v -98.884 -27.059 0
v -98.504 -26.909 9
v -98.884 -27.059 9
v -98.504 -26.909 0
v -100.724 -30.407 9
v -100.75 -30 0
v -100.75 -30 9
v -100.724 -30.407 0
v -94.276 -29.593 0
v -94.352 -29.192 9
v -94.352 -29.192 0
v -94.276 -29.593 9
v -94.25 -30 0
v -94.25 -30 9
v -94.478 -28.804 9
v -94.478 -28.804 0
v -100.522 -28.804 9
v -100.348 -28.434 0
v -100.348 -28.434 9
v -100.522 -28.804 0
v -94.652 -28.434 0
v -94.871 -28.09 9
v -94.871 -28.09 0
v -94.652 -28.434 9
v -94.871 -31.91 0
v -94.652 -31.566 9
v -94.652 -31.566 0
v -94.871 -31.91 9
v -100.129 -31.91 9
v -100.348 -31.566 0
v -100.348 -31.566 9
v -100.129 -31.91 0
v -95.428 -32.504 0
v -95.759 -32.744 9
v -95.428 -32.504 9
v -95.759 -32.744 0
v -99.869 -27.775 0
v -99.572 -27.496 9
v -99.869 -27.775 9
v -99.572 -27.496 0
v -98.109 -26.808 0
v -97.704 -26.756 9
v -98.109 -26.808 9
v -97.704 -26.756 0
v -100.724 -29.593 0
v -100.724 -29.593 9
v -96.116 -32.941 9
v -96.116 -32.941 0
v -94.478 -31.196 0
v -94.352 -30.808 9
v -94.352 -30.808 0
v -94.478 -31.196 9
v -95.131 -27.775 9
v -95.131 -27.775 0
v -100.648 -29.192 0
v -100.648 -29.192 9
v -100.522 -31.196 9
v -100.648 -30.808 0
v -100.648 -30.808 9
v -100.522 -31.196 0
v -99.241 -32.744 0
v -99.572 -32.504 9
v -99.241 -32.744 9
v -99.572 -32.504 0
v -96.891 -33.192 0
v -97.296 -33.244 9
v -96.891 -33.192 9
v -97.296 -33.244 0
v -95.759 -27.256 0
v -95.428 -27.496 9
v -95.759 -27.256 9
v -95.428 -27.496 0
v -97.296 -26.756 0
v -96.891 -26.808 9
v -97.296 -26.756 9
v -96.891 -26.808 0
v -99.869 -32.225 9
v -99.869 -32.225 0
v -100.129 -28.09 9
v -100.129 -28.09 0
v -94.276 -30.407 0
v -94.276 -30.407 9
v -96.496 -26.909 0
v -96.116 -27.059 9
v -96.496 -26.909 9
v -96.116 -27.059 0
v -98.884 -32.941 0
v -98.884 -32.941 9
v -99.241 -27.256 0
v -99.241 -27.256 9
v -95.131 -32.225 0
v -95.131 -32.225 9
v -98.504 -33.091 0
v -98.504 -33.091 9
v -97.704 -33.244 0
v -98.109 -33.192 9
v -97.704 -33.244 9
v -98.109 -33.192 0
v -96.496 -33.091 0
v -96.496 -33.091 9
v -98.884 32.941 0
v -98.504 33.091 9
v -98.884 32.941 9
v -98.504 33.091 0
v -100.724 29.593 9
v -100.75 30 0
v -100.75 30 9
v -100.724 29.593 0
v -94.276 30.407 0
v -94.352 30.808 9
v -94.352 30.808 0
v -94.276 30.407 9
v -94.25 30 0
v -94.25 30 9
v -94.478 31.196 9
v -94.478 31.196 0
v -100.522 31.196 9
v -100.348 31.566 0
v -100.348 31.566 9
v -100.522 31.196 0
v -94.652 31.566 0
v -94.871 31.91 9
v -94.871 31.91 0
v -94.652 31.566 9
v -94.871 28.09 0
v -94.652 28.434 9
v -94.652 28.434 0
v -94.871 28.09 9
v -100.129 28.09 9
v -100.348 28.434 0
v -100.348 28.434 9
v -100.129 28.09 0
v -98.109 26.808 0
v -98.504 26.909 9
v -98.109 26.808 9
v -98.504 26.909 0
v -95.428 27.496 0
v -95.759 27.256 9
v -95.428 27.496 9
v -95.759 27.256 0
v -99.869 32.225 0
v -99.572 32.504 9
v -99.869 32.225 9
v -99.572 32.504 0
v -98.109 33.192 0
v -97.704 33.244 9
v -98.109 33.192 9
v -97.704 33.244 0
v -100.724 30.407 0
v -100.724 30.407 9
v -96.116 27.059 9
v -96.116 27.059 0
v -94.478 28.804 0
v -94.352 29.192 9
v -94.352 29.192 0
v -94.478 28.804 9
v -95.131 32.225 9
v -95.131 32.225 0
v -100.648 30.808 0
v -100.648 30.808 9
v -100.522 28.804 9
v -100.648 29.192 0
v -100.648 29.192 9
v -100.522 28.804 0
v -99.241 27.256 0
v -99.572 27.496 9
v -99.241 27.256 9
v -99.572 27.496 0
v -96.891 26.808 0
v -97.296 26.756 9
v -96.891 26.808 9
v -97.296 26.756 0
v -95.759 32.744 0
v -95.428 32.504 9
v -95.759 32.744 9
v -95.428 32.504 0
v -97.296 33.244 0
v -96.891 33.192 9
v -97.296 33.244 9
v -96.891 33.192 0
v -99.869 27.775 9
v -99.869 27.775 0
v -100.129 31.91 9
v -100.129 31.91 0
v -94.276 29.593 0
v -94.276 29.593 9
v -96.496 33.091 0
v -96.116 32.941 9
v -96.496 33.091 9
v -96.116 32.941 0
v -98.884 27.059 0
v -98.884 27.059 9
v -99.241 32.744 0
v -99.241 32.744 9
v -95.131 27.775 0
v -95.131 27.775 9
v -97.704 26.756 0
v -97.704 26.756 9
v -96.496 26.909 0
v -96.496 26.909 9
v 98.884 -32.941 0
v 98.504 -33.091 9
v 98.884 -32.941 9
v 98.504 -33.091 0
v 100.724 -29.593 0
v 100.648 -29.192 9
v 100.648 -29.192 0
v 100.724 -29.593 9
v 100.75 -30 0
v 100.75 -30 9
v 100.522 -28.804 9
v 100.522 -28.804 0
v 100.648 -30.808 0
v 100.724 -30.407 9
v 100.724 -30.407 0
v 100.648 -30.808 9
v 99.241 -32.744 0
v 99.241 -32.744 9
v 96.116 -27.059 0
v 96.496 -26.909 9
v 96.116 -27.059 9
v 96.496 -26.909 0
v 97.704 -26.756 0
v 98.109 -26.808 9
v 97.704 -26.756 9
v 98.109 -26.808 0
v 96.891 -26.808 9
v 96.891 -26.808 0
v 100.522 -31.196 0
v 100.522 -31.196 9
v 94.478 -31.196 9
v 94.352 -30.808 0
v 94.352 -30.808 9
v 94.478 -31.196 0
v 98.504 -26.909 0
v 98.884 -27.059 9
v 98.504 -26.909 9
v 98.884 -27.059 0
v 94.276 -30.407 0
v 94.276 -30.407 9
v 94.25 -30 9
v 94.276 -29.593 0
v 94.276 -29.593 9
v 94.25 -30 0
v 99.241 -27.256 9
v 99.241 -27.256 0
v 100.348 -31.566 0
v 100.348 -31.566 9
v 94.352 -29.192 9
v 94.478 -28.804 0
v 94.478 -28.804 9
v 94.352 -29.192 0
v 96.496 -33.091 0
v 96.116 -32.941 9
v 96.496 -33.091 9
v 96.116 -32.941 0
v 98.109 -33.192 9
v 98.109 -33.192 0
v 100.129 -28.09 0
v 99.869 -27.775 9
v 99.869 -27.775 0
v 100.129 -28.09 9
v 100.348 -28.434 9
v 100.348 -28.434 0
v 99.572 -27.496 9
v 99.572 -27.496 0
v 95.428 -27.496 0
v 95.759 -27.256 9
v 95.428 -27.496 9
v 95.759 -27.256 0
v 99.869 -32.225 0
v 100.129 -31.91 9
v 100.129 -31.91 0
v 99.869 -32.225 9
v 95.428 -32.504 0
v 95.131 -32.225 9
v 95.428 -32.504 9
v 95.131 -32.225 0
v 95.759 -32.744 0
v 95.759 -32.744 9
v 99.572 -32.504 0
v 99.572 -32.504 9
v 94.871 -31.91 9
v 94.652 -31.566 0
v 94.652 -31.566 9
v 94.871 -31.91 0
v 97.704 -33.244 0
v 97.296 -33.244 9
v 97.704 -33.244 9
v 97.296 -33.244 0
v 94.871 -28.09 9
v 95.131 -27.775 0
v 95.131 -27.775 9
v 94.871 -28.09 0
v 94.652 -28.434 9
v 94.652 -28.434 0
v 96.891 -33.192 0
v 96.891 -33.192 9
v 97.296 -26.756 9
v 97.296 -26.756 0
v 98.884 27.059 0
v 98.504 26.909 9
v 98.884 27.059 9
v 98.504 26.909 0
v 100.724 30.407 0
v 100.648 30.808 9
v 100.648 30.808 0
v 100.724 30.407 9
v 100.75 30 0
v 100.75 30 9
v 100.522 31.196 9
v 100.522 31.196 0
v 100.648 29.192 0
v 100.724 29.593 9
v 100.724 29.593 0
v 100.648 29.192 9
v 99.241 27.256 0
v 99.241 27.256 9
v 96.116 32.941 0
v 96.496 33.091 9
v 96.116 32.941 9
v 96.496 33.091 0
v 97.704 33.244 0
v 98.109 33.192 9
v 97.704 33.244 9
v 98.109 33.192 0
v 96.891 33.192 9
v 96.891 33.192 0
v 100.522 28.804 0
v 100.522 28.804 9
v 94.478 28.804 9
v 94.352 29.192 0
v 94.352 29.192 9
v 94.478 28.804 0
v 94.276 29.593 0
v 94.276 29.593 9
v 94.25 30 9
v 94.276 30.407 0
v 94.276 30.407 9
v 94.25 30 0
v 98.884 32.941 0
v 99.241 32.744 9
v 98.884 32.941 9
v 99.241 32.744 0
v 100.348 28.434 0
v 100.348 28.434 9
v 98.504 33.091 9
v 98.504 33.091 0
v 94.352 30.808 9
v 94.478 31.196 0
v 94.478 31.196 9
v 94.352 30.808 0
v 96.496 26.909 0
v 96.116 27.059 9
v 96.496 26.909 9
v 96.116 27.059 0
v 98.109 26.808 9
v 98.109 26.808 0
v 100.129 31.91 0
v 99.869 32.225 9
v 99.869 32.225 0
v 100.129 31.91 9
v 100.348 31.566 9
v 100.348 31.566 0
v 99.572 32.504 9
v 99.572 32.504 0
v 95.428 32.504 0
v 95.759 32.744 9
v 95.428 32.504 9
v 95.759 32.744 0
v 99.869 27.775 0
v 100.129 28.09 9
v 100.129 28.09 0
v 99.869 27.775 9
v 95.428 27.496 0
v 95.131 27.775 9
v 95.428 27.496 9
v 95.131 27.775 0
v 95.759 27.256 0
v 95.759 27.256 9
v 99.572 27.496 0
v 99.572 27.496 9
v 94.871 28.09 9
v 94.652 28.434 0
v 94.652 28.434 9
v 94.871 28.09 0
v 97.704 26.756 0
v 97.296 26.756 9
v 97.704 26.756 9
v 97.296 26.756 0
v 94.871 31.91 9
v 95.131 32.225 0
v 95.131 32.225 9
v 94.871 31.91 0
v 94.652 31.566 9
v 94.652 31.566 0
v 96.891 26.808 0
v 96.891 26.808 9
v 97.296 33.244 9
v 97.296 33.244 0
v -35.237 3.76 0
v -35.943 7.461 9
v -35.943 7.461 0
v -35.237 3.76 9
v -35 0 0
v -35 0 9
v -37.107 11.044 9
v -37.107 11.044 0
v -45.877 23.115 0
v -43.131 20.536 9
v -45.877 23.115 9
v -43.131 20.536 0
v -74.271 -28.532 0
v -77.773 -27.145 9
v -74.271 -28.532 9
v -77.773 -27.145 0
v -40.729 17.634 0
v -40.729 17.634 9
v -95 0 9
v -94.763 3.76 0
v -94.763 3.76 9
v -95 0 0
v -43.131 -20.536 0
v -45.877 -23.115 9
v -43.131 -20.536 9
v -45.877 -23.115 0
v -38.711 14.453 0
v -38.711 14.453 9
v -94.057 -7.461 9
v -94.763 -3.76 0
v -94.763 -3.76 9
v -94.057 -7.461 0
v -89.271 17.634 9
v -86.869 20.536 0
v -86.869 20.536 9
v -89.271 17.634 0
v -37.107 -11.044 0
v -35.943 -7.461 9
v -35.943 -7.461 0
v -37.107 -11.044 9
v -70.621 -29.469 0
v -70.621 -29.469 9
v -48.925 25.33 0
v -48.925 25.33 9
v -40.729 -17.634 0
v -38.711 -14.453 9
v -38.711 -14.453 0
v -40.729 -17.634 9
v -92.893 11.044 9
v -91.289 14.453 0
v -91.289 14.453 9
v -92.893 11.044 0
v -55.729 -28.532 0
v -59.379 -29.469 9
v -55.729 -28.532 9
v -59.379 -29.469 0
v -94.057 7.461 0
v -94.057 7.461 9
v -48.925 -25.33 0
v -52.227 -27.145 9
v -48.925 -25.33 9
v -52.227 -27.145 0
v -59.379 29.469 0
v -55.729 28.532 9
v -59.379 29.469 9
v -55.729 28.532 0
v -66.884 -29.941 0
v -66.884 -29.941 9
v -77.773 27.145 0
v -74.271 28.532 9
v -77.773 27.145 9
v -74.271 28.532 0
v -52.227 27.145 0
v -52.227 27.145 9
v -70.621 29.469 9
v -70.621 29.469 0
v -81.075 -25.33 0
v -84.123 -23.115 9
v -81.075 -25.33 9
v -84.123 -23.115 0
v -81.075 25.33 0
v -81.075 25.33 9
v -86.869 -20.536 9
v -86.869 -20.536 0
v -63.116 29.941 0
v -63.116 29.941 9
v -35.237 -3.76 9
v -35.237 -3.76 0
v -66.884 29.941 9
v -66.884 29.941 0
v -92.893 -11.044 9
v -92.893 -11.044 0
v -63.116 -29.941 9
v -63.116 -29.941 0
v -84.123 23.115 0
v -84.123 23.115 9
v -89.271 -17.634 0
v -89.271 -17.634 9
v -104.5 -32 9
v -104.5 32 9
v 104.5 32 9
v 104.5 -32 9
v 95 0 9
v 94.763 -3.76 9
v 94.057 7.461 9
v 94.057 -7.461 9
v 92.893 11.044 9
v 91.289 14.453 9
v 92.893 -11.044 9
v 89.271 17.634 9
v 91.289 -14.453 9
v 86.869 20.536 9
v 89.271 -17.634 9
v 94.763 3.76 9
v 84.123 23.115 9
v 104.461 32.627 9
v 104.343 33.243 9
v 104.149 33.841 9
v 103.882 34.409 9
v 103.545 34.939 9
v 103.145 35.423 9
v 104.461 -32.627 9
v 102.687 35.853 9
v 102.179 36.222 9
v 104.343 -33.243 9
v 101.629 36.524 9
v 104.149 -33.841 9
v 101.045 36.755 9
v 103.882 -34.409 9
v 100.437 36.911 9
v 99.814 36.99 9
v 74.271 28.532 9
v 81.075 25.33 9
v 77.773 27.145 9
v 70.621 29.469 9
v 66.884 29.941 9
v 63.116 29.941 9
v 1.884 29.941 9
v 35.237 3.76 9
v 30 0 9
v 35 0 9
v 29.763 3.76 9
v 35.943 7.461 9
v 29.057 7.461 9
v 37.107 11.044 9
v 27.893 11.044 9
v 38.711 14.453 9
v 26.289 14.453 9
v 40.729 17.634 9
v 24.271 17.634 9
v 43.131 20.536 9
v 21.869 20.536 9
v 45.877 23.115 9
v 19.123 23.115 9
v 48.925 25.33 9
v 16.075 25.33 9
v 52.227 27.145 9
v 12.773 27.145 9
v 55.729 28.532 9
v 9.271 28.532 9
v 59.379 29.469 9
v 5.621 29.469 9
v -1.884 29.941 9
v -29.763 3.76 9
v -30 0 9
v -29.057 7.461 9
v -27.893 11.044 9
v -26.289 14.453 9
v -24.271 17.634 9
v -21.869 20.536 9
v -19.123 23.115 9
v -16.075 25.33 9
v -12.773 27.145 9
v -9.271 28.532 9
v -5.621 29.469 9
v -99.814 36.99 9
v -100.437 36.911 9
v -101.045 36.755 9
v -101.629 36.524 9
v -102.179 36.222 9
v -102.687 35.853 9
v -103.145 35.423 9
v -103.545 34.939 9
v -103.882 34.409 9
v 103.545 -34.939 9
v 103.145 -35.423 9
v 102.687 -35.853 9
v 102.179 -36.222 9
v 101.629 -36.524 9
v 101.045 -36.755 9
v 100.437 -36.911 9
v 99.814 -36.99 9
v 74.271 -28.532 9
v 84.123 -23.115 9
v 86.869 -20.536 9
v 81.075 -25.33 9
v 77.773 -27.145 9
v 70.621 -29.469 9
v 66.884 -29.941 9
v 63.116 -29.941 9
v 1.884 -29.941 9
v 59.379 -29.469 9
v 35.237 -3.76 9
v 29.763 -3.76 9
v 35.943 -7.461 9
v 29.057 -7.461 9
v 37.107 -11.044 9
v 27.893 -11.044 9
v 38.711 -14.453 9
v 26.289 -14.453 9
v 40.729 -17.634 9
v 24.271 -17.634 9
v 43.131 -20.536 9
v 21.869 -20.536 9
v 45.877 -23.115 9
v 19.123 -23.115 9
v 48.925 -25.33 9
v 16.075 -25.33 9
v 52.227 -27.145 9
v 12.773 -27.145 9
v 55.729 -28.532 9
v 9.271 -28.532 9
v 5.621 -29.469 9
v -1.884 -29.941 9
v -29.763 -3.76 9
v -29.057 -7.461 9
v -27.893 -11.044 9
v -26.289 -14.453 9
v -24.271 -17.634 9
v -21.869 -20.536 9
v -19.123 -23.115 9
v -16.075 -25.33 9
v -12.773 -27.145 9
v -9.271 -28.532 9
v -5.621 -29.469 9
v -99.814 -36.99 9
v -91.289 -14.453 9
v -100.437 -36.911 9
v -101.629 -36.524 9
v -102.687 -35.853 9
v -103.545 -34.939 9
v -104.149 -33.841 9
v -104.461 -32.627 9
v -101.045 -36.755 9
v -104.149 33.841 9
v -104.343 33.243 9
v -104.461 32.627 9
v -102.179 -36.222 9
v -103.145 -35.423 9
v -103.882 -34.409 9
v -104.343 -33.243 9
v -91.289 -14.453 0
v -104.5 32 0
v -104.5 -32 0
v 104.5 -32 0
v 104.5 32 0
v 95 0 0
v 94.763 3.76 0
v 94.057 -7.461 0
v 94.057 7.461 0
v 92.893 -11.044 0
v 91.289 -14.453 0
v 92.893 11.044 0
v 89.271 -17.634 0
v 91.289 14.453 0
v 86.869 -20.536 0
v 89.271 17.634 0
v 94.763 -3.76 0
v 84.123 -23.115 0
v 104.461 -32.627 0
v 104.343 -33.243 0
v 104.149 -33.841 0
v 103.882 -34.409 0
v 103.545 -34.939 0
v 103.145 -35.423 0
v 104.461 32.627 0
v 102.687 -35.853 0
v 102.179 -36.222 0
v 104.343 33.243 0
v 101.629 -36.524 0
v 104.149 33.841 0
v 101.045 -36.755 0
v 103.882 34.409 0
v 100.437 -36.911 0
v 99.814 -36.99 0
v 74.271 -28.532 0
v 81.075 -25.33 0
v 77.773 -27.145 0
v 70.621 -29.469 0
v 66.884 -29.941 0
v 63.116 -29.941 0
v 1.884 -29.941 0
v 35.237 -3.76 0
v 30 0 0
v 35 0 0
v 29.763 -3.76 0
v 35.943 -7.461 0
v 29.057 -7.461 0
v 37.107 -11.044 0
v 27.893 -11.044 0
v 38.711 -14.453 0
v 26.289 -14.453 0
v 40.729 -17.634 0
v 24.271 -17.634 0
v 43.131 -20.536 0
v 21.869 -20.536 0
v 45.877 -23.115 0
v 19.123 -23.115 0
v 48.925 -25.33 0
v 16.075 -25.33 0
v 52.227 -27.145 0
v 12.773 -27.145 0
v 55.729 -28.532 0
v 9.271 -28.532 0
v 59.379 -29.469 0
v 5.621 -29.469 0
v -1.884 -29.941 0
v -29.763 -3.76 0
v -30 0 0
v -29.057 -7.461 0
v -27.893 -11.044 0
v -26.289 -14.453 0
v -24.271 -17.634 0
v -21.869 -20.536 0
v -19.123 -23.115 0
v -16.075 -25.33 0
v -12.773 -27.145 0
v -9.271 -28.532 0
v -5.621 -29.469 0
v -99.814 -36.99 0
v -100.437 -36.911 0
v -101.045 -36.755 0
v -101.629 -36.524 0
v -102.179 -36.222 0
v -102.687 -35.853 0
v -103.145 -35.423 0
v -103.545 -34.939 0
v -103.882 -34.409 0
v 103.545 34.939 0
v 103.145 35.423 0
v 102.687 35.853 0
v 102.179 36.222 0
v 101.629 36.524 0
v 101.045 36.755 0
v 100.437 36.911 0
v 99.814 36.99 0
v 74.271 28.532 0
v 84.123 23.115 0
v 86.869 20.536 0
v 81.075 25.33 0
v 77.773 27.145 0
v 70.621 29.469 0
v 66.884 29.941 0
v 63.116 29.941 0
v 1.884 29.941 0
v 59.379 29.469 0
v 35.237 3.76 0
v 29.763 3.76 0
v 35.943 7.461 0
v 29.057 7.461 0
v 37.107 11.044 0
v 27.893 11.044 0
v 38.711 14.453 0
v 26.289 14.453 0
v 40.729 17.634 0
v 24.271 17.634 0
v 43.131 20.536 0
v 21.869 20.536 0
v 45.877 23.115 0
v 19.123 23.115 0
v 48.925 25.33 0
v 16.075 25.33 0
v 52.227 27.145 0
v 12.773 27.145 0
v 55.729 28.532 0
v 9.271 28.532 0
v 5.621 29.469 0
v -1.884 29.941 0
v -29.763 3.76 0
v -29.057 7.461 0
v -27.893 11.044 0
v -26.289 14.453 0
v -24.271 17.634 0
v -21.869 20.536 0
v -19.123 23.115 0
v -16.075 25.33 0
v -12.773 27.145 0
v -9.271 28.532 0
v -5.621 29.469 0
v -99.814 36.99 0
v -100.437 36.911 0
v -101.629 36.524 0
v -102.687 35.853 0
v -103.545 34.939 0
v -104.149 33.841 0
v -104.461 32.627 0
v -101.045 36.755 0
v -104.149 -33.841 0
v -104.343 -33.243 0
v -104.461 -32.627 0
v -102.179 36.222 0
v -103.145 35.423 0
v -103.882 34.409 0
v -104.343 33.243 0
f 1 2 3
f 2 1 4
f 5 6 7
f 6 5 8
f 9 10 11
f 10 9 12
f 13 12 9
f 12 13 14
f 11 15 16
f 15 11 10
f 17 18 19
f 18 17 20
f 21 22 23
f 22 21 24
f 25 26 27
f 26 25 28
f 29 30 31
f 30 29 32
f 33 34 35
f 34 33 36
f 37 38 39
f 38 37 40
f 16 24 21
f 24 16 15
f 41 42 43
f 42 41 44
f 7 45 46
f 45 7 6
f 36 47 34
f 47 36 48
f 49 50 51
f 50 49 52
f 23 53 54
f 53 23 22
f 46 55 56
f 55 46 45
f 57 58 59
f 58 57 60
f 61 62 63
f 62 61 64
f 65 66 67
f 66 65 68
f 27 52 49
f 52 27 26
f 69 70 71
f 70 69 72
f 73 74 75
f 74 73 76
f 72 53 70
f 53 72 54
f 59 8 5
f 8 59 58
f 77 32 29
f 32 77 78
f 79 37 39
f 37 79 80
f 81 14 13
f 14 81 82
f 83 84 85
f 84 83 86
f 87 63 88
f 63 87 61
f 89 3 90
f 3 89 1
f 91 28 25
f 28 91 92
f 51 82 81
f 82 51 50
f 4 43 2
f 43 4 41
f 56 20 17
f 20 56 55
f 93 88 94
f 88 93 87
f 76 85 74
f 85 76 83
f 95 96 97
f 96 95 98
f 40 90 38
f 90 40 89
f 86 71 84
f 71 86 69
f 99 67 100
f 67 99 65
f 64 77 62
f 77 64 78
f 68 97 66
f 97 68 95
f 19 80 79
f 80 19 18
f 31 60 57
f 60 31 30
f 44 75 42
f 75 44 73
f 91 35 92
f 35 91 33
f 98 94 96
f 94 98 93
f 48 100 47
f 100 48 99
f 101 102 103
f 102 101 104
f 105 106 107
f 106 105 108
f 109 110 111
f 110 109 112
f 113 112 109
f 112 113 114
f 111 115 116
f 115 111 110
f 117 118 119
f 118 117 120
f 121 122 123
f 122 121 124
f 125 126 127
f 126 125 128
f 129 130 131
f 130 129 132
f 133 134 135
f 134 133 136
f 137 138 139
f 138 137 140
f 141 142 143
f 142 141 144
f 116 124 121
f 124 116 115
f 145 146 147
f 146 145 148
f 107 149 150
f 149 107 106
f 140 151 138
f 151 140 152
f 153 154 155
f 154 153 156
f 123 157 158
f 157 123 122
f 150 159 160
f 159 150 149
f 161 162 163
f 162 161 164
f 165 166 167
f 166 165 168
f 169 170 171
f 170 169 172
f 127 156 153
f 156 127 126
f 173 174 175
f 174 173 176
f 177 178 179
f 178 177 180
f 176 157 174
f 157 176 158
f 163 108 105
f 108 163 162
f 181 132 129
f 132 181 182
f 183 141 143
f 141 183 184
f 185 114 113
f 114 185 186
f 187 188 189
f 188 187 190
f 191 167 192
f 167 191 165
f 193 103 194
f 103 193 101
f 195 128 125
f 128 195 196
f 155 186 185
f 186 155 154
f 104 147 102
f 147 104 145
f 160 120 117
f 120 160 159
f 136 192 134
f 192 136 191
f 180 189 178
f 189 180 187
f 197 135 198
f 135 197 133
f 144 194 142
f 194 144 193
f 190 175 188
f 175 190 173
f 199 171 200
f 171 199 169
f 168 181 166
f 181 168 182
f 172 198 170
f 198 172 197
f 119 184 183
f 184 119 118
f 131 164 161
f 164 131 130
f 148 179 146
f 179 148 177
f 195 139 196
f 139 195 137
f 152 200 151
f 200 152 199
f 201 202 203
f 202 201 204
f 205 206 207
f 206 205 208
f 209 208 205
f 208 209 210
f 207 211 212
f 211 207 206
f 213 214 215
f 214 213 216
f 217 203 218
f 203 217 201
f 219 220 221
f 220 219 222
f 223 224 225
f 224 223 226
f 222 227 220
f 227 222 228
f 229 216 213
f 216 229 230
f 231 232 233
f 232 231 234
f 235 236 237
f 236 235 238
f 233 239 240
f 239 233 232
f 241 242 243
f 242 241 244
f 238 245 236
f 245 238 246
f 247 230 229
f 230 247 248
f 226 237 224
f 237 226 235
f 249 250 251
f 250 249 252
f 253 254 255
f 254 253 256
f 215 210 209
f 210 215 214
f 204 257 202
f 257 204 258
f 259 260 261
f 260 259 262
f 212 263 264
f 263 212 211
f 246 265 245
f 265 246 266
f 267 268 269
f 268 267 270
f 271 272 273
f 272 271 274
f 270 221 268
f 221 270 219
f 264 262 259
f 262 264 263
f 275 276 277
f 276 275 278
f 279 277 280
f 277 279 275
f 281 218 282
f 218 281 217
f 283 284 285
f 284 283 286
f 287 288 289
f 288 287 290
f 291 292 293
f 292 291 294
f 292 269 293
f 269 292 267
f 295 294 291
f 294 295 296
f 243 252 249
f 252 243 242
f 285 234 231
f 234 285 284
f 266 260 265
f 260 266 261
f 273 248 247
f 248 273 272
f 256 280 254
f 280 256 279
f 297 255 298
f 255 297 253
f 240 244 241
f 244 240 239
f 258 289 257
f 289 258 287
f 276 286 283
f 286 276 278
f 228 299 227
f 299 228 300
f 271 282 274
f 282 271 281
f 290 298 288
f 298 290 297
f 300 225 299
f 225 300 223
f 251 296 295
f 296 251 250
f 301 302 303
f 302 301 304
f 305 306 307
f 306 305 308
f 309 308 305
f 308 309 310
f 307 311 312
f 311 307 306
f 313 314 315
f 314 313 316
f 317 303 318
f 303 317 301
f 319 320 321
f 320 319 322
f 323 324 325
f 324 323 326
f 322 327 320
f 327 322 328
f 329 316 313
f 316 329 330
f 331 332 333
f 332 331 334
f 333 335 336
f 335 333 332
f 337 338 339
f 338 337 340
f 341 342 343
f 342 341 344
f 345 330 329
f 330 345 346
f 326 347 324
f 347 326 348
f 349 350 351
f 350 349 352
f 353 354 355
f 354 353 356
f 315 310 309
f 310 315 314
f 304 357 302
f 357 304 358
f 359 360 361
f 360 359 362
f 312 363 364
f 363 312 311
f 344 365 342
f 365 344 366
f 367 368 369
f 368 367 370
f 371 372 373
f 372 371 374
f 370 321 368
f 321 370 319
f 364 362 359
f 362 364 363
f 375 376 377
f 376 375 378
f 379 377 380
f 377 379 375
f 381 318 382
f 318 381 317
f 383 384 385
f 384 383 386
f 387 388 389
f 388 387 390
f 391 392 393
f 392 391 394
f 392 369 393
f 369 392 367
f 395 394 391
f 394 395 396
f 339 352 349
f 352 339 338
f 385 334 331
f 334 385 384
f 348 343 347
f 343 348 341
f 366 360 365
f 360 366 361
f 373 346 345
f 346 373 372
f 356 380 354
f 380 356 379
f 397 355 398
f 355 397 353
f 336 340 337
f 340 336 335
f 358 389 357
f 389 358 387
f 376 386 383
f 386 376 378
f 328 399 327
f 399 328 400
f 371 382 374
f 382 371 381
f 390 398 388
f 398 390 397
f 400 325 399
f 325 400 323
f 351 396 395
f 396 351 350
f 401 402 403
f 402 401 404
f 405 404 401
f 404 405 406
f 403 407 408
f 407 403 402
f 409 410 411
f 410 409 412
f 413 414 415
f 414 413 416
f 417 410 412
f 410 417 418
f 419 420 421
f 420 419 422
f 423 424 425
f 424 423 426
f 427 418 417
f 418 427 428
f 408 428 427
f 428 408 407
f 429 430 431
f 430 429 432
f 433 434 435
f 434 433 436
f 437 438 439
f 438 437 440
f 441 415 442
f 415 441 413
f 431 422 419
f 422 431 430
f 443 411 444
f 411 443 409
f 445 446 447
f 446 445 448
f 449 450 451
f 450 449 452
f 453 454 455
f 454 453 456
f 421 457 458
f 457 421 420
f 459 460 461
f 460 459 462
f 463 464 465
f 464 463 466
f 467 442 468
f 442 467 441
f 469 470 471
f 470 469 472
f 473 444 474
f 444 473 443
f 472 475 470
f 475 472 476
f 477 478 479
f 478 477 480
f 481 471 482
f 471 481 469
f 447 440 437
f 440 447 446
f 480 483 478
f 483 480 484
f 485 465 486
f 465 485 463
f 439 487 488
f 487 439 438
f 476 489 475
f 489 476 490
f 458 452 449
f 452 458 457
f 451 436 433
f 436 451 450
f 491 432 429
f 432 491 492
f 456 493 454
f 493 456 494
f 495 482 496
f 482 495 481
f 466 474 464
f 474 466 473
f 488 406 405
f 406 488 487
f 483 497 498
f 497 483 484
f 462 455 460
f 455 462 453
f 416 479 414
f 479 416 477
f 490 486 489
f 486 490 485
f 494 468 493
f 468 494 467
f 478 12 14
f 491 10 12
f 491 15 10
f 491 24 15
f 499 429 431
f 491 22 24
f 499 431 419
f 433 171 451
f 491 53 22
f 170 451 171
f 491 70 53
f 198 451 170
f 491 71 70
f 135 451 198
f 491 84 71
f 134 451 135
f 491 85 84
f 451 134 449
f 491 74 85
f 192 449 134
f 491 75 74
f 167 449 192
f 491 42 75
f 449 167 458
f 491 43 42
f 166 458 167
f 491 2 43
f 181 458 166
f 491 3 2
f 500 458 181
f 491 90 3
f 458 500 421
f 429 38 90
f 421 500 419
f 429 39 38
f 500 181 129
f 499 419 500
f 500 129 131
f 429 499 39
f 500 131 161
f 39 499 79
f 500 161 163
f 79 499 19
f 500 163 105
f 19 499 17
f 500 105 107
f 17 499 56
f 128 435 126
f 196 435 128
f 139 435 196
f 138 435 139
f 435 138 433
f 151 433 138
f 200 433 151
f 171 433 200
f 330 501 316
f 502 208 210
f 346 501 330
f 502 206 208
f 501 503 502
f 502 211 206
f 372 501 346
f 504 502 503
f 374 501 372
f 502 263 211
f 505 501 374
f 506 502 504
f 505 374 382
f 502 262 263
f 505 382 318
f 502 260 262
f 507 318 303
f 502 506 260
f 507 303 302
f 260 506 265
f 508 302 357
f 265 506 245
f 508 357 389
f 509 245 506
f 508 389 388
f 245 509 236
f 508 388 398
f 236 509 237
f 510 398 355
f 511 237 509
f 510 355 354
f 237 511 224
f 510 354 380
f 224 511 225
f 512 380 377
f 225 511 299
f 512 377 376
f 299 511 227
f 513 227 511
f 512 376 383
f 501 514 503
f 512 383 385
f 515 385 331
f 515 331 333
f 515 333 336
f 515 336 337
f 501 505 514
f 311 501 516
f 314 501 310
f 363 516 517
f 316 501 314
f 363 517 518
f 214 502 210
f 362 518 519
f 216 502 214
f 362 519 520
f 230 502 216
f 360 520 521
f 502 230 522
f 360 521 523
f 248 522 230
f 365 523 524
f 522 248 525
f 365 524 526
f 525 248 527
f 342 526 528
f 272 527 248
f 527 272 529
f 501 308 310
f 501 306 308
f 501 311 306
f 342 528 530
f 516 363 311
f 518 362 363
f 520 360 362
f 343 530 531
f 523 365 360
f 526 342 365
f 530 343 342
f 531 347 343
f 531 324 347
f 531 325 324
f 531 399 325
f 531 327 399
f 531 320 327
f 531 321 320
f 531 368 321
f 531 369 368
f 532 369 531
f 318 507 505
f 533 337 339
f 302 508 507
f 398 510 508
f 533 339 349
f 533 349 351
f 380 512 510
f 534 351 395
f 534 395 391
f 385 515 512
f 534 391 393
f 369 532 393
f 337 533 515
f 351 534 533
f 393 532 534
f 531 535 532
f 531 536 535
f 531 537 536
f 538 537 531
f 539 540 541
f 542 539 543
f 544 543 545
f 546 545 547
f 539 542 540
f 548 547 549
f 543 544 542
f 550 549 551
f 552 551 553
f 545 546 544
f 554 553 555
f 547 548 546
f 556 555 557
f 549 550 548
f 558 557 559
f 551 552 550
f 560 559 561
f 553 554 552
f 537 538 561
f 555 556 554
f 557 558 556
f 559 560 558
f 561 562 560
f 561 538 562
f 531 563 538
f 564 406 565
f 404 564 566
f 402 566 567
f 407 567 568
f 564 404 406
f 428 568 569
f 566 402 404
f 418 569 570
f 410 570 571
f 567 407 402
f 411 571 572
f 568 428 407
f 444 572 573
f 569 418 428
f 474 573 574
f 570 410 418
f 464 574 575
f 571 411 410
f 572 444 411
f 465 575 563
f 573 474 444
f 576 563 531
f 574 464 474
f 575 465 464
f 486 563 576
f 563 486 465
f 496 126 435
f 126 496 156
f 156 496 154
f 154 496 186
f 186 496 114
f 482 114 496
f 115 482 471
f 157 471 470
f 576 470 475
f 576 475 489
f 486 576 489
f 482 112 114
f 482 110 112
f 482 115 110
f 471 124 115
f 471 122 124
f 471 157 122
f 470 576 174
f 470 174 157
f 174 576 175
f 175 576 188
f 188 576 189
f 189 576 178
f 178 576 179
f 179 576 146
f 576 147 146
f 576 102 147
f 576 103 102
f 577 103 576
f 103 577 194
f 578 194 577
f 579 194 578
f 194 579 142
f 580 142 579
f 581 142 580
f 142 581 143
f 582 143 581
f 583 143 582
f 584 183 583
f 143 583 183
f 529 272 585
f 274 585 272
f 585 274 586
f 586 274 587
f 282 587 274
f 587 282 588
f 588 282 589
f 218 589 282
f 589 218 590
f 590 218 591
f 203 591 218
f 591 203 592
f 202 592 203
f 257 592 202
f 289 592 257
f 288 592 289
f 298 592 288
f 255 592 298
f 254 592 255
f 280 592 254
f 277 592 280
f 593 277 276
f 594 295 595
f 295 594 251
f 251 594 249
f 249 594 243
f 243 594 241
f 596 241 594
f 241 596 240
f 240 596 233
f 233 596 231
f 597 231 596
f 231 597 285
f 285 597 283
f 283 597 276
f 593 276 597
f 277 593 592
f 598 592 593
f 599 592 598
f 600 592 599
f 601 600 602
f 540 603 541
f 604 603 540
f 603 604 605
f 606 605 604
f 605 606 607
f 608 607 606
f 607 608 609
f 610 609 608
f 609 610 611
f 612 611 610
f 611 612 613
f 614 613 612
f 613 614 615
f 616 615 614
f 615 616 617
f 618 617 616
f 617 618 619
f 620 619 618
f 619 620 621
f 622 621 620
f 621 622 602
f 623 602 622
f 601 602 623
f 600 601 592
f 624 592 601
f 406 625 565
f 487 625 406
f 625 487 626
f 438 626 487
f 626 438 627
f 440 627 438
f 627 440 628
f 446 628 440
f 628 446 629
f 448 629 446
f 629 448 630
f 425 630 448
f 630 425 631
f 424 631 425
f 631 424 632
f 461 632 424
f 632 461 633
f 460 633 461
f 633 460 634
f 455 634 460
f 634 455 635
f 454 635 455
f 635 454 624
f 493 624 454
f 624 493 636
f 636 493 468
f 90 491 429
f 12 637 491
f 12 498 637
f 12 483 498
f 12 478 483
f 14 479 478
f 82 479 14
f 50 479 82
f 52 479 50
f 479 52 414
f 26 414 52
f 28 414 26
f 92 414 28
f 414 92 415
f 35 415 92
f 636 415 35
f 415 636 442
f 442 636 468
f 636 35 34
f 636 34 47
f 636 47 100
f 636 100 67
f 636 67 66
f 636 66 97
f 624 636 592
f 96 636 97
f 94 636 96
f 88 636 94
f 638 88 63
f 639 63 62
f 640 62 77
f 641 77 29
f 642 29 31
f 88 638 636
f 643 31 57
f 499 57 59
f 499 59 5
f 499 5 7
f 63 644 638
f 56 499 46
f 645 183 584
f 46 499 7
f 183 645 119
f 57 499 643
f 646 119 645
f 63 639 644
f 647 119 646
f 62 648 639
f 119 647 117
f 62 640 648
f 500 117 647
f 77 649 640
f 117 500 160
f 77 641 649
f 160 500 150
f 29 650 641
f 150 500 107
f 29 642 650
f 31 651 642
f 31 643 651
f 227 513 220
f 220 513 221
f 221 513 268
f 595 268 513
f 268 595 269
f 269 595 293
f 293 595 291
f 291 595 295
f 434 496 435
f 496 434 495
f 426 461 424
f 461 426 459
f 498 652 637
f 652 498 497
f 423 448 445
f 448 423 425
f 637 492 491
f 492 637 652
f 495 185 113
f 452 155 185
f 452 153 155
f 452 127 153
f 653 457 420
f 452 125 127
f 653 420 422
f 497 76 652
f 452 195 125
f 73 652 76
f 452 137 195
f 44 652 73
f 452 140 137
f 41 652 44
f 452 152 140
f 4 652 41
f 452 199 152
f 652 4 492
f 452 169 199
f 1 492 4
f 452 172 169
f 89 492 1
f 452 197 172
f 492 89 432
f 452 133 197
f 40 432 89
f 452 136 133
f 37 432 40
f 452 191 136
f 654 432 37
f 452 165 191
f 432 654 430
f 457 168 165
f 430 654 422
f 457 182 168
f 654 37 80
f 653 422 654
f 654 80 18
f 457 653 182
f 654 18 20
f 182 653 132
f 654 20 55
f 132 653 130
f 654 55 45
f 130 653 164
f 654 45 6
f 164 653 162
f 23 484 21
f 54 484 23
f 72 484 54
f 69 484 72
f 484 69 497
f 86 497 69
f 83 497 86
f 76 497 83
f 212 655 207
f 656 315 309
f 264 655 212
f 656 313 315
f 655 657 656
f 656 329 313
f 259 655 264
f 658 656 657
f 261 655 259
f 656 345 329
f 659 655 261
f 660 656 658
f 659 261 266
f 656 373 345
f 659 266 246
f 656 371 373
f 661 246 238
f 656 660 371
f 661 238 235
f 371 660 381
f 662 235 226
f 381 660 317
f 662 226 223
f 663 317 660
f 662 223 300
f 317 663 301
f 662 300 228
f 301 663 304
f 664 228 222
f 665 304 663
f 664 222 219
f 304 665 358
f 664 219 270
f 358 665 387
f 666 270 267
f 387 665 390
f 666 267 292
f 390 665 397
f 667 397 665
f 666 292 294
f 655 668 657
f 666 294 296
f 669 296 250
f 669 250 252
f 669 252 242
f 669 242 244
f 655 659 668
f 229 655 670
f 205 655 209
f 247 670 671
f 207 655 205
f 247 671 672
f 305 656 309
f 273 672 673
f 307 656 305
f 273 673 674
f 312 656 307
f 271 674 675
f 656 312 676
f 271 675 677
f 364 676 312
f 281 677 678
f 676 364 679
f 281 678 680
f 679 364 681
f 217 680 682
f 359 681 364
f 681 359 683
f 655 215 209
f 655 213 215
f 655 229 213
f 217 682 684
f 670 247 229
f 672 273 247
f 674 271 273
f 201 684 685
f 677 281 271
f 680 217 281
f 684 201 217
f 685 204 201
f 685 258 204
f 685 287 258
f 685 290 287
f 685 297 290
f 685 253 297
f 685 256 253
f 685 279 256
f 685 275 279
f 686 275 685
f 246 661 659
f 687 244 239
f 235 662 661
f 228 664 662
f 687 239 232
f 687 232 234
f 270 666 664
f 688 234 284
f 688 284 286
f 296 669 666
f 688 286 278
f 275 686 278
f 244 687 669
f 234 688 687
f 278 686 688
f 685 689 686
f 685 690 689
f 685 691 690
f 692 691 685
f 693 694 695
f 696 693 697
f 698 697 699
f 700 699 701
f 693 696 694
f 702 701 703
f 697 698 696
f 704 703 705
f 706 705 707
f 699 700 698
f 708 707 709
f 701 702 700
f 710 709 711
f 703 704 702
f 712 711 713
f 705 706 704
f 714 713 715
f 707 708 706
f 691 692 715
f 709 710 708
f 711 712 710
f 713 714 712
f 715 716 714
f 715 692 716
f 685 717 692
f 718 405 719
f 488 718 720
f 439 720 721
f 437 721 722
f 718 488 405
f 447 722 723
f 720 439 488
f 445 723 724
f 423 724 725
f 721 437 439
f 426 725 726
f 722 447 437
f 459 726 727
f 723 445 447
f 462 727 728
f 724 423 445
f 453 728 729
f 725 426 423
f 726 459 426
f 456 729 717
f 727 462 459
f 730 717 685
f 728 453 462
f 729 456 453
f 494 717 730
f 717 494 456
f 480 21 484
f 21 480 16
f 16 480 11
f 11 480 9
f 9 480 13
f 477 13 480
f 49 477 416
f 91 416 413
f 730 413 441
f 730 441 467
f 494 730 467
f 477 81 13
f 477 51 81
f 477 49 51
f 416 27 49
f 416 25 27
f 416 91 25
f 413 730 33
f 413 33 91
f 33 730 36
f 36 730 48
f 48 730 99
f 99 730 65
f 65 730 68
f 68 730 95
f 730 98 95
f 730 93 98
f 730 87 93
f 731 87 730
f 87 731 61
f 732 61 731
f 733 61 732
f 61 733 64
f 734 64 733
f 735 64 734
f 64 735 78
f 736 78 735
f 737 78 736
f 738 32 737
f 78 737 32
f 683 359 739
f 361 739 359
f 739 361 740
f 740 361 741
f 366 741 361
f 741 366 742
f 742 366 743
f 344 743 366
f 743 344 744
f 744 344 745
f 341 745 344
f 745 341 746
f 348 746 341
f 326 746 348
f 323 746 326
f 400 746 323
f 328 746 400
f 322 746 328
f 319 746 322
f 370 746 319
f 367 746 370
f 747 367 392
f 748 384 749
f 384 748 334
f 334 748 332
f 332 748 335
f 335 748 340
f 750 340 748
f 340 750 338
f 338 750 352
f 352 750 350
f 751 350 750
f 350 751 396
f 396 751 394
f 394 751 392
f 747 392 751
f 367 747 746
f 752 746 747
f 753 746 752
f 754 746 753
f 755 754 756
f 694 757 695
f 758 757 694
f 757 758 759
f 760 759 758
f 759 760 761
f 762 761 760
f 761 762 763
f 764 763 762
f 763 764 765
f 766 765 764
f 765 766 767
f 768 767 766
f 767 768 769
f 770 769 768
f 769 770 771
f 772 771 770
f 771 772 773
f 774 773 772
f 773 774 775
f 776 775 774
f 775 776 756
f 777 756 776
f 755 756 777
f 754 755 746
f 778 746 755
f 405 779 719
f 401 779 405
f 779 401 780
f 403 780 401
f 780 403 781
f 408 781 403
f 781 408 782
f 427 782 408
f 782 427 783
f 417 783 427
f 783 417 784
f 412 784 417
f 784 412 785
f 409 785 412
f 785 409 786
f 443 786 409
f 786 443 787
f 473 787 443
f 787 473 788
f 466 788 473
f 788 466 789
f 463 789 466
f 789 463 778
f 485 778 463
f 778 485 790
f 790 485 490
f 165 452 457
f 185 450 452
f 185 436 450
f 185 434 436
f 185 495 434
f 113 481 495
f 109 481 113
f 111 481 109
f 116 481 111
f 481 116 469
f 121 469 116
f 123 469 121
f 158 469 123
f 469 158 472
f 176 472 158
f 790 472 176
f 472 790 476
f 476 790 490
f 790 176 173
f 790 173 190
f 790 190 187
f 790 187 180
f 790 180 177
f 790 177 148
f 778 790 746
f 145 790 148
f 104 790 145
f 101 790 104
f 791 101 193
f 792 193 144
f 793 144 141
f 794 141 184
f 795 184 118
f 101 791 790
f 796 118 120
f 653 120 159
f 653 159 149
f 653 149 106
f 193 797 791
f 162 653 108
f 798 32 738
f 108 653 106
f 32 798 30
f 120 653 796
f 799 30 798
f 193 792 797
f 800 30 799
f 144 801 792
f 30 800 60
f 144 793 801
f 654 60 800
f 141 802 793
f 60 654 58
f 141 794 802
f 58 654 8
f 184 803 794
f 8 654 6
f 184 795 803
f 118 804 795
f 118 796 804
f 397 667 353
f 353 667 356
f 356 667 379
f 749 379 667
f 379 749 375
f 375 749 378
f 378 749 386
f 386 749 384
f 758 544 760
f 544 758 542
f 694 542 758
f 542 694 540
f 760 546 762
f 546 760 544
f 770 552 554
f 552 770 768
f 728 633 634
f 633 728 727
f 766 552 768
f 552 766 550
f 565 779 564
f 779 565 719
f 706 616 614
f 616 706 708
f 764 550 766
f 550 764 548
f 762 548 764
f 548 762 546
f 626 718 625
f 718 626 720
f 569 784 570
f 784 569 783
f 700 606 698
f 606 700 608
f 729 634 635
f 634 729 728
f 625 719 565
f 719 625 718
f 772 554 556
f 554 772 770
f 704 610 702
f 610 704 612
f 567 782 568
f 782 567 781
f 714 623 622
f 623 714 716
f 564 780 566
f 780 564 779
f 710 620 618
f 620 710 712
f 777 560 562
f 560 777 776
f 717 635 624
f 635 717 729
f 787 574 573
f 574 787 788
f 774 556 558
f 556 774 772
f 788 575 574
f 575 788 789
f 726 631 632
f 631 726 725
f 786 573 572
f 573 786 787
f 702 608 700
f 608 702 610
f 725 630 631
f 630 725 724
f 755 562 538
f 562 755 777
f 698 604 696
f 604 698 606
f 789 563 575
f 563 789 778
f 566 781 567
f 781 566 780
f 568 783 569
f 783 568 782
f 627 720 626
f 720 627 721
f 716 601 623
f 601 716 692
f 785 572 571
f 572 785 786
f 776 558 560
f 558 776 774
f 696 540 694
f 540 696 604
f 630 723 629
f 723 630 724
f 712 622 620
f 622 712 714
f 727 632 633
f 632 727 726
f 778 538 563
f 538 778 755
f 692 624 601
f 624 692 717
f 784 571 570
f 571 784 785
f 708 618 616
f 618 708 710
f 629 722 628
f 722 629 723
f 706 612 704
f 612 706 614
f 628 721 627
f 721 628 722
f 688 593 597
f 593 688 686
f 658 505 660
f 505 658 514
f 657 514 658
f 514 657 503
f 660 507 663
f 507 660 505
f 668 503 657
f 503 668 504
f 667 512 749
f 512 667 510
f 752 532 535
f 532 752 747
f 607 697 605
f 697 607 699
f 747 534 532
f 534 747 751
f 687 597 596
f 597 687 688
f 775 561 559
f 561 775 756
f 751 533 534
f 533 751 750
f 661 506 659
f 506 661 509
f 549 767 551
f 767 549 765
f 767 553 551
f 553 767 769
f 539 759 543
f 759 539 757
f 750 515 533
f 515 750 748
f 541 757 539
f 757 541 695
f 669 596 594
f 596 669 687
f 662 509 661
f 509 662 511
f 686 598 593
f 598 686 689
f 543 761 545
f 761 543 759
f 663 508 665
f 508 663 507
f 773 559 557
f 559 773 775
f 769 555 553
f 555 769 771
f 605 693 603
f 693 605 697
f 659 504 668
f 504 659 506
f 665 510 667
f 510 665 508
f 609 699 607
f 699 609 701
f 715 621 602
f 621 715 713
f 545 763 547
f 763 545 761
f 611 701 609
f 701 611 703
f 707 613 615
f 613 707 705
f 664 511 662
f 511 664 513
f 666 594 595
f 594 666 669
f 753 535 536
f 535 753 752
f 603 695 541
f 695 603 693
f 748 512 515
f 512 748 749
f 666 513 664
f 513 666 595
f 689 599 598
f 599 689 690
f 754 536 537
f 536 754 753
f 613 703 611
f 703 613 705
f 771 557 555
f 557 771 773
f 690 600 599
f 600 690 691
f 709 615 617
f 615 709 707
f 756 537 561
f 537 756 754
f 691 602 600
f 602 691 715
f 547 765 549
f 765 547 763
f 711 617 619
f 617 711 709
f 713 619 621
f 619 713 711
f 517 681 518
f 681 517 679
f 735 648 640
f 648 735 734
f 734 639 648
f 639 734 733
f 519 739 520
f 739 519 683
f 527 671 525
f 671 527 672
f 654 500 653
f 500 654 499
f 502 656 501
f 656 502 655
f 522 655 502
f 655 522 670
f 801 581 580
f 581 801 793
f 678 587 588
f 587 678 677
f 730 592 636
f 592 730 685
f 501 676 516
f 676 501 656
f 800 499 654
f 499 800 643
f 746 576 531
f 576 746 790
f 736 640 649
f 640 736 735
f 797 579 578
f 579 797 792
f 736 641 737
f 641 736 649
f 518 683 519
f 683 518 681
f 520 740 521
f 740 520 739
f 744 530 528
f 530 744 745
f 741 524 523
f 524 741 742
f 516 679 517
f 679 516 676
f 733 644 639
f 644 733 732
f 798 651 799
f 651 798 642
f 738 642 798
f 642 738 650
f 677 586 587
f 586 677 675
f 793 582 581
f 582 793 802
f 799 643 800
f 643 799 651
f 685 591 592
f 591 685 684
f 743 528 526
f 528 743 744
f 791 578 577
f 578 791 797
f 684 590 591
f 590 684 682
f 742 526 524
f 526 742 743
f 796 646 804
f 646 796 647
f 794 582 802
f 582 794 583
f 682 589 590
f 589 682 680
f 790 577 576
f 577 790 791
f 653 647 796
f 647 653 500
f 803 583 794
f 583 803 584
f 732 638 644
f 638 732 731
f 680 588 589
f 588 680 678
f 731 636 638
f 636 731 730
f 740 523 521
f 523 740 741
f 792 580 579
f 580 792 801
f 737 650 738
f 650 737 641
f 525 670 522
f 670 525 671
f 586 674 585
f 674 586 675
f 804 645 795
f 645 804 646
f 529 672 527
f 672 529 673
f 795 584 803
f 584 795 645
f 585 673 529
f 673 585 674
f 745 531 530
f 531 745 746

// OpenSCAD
$fn = 50;

difference() {
	union() {
		hull() {
			translate(v = [-99.5, 32.0, 0]) {
				cylinder(h = 9, r = 5);
			}
			translate(v = [99.5, 32.0, 0]) {
				cylinder(h = 9, r = 5);
			}
			translate(v = [-99.5, -32.0, 0]) {
				cylinder(h = 9, r = 5);
			}
			translate(v = [99.5, -32.0, 0]) {
				cylinder(h = 9, r = 5);
			}
		}
	}
	union() {
		translate(v = [-97.5, -30.0, -100.0]) {
			cylinder(h = 200, r = 3.25);
		}
		translate(v = [-97.5, 30.0, -100.0]) {
			cylinder(h = 200, r = 3.25);
		}
		translate(v = [97.5, -30.0, -100.0]) {
			cylinder(h = 200, r = 3.25);
		}
		translate(v = [97.5, 30.0, -100.0]) {
			cylinder(h = 200, r = 3.25);
		}
		translate(v = [-97.5, -30.0, -100.0]) {
			cylinder(h = 200, r = 1.8);
		}
		translate(v = [-97.5, 30.0, -100.0]) {
			cylinder(h = 200, r = 1.8);
		}
		translate(v = [97.5, -30.0, -100.0]) {
			cylinder(h = 200, r = 1.8);
		}
		translate(v = [97.5, 30.0, -100.0]) {
			cylinder(h = 200, r = 1.8);
		}
		translate(v = [-65.0, 0, 0.0]) {
			cylinder(h = 9, r = 30.0);
		}
		cylinder(h = 9, r = 30.0);
		translate(v = [65.0, 0, 0.0]) {
			cylinder(h = 9, r = 30.0);
		}
	}
}
